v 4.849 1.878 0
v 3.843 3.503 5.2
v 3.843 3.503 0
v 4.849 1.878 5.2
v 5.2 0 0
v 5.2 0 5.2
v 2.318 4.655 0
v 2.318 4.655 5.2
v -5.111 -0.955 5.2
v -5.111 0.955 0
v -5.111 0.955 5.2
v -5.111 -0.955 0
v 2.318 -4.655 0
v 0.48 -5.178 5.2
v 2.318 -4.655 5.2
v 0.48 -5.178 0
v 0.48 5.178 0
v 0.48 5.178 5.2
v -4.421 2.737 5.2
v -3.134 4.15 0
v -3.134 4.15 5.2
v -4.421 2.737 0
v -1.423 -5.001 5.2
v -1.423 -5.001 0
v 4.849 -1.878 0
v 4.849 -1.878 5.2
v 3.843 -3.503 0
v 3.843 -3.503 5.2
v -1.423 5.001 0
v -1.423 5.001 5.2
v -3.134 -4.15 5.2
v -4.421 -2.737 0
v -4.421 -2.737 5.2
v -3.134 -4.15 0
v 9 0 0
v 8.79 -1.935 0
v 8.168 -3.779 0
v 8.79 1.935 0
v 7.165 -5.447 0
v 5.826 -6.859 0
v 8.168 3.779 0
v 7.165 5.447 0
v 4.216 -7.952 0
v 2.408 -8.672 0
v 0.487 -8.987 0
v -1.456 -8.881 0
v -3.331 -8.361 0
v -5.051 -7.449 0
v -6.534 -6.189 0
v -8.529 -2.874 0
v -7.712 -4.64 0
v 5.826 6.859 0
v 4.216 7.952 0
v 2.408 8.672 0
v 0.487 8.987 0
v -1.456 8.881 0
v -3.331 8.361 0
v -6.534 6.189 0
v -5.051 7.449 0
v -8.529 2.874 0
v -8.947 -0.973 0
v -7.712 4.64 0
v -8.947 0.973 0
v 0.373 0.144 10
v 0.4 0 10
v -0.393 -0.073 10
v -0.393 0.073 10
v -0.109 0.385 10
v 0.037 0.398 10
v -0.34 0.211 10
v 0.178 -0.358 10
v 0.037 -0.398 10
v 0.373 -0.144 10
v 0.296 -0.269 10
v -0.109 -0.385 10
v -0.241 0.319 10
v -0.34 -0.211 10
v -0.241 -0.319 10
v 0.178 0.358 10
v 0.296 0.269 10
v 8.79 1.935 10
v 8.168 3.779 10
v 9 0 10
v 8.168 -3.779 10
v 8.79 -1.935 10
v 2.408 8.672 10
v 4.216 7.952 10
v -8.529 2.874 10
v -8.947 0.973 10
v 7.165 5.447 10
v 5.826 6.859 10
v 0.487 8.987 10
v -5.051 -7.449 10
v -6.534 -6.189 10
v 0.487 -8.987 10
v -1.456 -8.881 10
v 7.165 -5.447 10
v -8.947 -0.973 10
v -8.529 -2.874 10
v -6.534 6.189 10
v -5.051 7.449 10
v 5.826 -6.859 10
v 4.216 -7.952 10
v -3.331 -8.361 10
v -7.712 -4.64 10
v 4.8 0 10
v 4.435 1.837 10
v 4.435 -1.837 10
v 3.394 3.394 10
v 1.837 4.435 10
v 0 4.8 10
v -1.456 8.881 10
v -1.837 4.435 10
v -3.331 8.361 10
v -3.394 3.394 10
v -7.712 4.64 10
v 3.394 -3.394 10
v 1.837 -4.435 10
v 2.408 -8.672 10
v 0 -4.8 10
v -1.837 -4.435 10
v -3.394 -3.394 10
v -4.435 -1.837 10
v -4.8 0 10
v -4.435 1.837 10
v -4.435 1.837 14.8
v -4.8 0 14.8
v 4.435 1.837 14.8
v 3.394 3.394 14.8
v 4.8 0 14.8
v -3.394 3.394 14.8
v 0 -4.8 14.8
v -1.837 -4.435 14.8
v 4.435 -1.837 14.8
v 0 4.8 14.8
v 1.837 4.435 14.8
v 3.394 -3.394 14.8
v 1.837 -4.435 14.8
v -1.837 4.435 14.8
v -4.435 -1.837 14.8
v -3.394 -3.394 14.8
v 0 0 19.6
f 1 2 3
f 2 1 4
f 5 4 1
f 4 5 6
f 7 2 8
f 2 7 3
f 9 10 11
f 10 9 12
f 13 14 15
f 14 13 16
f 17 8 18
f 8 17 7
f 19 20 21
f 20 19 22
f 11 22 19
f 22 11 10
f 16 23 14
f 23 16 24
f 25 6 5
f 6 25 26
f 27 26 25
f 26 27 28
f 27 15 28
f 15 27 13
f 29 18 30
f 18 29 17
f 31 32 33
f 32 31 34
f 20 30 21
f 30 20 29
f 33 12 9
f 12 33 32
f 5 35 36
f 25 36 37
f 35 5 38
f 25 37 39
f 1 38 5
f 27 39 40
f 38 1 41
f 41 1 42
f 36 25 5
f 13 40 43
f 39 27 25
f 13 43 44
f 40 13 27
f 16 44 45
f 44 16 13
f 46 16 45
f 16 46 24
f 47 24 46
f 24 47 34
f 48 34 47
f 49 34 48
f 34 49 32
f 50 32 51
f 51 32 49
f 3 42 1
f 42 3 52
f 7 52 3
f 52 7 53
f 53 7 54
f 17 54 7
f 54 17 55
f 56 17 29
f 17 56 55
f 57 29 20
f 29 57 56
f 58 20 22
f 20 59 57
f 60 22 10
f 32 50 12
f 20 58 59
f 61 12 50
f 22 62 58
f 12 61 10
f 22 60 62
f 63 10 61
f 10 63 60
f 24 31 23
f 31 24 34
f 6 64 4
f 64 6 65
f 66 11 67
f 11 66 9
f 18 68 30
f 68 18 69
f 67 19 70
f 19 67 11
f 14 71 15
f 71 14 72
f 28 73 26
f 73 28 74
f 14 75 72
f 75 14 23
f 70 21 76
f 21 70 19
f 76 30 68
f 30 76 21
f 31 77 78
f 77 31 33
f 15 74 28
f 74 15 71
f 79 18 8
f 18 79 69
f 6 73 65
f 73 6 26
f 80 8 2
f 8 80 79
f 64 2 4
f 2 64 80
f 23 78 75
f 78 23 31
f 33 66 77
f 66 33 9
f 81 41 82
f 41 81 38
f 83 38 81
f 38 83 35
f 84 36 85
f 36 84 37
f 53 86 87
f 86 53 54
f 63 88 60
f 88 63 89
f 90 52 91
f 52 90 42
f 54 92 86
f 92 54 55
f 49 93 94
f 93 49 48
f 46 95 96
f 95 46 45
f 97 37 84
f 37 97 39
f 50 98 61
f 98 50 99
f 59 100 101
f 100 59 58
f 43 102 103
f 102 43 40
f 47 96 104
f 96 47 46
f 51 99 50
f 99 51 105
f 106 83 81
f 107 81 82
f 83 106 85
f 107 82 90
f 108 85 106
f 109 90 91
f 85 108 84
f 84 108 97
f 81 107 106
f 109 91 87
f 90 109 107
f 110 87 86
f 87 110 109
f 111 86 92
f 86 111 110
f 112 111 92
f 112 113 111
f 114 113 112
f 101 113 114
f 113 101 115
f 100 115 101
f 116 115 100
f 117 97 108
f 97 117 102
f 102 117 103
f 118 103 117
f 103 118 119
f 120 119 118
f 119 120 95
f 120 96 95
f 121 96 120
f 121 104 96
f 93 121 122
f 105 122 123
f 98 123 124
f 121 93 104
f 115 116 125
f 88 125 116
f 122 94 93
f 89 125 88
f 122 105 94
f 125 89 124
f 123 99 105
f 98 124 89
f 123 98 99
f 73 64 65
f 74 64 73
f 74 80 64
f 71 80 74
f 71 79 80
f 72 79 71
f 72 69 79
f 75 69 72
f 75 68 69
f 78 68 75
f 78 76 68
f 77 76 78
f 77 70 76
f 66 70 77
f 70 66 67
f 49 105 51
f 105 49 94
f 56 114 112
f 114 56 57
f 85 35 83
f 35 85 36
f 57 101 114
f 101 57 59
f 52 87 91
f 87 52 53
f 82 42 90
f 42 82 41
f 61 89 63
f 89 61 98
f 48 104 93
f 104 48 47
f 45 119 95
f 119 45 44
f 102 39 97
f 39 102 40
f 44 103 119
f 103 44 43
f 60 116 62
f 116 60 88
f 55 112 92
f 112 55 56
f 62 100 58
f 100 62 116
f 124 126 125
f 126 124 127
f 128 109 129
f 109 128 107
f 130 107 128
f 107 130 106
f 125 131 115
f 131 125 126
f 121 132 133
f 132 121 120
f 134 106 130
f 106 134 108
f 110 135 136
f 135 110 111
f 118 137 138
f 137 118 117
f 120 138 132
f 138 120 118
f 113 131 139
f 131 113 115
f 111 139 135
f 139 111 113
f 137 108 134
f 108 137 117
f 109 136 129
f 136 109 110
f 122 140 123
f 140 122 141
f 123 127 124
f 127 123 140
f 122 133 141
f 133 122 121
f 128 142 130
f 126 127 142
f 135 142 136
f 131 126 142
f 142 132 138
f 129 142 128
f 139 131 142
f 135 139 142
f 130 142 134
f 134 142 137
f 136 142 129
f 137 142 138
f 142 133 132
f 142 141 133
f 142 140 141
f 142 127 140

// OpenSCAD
height = 10;
radius = 18/2;
joinHeight = 5;


module baseCylinder () {
  cylinder(h=height, r=radius);
}

module segmentJoin (change, h) {
    joinRadius = (radius - change);
    cylinder(h=h, r=joinRadius);

    translate(v=[0, 0, h]) 
    cylinder(h=joinRadius, r1=joinRadius, r2=0);
}


module segment () {
    difference() {
        baseCylinder();
        segmentJoin(3.8, joinHeight + 0.2); // 0.2 smaller, bigger
    }
    
    translate(v=[0,0,height]) 
    segmentJoin(4.2, joinHeight - 0.2); // 0.2 bigger, smaller
}

segment();


// difference() {
//     segment();
//     cube(50);
// }
